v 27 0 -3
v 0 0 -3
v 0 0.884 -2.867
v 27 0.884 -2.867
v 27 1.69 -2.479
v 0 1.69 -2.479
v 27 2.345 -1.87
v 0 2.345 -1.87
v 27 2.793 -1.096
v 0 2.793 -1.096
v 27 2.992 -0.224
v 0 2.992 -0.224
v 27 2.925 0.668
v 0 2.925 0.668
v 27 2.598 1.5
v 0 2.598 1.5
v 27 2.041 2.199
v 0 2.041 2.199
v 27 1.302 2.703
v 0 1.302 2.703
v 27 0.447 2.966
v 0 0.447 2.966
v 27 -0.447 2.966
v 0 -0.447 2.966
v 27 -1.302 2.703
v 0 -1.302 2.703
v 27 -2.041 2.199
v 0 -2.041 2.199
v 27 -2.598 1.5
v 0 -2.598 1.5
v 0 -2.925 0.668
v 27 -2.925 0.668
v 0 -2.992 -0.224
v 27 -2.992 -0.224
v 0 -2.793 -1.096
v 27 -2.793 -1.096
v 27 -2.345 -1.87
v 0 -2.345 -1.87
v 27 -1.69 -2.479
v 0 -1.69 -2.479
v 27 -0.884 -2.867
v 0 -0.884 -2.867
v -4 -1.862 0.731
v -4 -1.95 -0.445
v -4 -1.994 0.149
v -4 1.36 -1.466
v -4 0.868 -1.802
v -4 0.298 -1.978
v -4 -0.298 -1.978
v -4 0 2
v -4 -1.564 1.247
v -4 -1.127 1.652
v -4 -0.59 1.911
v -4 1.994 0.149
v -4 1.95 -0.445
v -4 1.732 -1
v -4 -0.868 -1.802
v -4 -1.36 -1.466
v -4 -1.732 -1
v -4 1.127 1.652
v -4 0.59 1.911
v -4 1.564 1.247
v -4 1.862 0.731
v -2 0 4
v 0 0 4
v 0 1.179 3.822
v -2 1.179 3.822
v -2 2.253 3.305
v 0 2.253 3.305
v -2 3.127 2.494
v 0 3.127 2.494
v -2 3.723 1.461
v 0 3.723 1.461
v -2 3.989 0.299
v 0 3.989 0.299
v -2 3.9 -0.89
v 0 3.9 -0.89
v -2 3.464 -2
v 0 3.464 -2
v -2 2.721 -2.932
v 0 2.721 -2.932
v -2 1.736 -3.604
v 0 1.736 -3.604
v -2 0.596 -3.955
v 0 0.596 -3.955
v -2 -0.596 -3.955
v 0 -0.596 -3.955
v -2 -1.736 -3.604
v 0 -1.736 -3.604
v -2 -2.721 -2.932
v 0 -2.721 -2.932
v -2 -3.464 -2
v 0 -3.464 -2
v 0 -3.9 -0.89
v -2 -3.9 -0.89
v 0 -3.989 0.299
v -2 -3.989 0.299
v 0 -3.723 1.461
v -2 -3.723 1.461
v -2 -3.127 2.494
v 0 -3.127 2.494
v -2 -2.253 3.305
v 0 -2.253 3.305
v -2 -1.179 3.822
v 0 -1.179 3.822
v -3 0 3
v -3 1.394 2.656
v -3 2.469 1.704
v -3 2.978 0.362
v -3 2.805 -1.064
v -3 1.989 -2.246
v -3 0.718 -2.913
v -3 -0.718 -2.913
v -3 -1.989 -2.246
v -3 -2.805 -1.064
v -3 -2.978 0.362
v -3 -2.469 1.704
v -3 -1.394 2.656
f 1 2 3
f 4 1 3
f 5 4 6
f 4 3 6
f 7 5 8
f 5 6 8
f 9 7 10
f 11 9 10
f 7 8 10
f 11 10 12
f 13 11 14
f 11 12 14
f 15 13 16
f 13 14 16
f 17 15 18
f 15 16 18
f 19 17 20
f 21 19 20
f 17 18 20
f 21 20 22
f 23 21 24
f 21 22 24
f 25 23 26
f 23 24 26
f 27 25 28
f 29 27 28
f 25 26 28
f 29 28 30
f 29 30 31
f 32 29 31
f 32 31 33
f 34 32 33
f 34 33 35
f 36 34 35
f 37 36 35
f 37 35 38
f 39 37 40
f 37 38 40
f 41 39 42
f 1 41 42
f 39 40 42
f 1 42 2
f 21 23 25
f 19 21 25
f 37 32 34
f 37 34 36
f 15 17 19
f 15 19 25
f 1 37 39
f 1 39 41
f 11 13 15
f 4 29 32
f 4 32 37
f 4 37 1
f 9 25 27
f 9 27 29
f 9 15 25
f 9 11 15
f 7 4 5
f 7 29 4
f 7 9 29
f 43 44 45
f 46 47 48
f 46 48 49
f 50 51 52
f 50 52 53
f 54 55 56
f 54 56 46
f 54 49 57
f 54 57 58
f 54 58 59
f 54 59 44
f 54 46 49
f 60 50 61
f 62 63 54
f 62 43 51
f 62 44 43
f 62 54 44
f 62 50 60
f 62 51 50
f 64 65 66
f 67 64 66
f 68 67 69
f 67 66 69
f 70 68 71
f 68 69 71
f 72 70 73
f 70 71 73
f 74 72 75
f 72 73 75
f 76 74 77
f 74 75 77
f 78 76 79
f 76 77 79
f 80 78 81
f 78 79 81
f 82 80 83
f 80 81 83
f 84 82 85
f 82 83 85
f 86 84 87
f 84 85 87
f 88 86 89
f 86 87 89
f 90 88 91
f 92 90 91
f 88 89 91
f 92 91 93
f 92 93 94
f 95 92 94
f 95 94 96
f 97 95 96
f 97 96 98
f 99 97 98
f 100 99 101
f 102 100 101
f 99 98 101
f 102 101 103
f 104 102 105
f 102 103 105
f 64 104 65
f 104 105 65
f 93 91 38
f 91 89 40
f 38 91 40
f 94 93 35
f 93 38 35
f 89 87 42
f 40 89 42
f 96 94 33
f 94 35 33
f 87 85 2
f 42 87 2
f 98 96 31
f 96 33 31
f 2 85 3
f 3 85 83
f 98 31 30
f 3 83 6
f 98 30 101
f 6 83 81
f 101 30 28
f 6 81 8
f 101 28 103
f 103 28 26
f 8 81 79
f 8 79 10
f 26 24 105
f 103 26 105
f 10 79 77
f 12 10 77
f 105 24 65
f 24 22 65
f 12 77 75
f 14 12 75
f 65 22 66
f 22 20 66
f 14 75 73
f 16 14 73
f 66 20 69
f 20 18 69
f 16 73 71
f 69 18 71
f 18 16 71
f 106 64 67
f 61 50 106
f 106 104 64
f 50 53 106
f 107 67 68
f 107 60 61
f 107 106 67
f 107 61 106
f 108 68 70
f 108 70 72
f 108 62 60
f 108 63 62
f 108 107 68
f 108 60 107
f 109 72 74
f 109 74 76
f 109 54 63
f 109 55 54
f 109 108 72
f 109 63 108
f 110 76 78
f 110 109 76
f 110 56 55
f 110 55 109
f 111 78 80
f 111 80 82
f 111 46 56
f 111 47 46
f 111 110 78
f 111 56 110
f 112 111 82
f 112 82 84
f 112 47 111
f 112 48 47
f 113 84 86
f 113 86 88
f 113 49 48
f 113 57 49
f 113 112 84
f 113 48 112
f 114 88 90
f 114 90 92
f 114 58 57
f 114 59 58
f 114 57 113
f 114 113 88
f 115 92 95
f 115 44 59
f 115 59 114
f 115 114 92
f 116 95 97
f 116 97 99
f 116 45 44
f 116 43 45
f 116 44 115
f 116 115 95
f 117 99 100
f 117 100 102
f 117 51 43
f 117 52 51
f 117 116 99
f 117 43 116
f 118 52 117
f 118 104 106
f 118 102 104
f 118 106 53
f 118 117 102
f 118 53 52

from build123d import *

# Parameters (mm, degrees)
SKETCH1_R           = 3
BOSS_EXTRUDE1_DEPTH = 27
SKETCH2_R           = 4
BOSS_EXTRUDE2_DEPTH = 4
CHAMFER1_SIZE       = 2


with BuildPart() as part:
    # Sketch1 → Boss-Extrude1 (new body)
    with BuildSketch(Plane(origin=(0, 0, 0), x_dir=(0, 0, -1), z_dir=(1, 0, 0))):
        Circle(SKETCH1_R)
    extrude(amount=BOSS_EXTRUDE1_DEPTH)

    # Sketch2 → Boss-Extrude2 (add)
    with BuildSketch(Plane.ZY):
        Circle(SKETCH2_R)
    extrude(amount=BOSS_EXTRUDE2_DEPTH)

    # Chamfer1
    chamfer1_edges = [part.edges().sort_by_distance(p)[0] for p in [
        (-4, 0, -4),
    ]]
    chamfer(chamfer1_edges, length=CHAMFER1_SIZE)


solid = part.part
